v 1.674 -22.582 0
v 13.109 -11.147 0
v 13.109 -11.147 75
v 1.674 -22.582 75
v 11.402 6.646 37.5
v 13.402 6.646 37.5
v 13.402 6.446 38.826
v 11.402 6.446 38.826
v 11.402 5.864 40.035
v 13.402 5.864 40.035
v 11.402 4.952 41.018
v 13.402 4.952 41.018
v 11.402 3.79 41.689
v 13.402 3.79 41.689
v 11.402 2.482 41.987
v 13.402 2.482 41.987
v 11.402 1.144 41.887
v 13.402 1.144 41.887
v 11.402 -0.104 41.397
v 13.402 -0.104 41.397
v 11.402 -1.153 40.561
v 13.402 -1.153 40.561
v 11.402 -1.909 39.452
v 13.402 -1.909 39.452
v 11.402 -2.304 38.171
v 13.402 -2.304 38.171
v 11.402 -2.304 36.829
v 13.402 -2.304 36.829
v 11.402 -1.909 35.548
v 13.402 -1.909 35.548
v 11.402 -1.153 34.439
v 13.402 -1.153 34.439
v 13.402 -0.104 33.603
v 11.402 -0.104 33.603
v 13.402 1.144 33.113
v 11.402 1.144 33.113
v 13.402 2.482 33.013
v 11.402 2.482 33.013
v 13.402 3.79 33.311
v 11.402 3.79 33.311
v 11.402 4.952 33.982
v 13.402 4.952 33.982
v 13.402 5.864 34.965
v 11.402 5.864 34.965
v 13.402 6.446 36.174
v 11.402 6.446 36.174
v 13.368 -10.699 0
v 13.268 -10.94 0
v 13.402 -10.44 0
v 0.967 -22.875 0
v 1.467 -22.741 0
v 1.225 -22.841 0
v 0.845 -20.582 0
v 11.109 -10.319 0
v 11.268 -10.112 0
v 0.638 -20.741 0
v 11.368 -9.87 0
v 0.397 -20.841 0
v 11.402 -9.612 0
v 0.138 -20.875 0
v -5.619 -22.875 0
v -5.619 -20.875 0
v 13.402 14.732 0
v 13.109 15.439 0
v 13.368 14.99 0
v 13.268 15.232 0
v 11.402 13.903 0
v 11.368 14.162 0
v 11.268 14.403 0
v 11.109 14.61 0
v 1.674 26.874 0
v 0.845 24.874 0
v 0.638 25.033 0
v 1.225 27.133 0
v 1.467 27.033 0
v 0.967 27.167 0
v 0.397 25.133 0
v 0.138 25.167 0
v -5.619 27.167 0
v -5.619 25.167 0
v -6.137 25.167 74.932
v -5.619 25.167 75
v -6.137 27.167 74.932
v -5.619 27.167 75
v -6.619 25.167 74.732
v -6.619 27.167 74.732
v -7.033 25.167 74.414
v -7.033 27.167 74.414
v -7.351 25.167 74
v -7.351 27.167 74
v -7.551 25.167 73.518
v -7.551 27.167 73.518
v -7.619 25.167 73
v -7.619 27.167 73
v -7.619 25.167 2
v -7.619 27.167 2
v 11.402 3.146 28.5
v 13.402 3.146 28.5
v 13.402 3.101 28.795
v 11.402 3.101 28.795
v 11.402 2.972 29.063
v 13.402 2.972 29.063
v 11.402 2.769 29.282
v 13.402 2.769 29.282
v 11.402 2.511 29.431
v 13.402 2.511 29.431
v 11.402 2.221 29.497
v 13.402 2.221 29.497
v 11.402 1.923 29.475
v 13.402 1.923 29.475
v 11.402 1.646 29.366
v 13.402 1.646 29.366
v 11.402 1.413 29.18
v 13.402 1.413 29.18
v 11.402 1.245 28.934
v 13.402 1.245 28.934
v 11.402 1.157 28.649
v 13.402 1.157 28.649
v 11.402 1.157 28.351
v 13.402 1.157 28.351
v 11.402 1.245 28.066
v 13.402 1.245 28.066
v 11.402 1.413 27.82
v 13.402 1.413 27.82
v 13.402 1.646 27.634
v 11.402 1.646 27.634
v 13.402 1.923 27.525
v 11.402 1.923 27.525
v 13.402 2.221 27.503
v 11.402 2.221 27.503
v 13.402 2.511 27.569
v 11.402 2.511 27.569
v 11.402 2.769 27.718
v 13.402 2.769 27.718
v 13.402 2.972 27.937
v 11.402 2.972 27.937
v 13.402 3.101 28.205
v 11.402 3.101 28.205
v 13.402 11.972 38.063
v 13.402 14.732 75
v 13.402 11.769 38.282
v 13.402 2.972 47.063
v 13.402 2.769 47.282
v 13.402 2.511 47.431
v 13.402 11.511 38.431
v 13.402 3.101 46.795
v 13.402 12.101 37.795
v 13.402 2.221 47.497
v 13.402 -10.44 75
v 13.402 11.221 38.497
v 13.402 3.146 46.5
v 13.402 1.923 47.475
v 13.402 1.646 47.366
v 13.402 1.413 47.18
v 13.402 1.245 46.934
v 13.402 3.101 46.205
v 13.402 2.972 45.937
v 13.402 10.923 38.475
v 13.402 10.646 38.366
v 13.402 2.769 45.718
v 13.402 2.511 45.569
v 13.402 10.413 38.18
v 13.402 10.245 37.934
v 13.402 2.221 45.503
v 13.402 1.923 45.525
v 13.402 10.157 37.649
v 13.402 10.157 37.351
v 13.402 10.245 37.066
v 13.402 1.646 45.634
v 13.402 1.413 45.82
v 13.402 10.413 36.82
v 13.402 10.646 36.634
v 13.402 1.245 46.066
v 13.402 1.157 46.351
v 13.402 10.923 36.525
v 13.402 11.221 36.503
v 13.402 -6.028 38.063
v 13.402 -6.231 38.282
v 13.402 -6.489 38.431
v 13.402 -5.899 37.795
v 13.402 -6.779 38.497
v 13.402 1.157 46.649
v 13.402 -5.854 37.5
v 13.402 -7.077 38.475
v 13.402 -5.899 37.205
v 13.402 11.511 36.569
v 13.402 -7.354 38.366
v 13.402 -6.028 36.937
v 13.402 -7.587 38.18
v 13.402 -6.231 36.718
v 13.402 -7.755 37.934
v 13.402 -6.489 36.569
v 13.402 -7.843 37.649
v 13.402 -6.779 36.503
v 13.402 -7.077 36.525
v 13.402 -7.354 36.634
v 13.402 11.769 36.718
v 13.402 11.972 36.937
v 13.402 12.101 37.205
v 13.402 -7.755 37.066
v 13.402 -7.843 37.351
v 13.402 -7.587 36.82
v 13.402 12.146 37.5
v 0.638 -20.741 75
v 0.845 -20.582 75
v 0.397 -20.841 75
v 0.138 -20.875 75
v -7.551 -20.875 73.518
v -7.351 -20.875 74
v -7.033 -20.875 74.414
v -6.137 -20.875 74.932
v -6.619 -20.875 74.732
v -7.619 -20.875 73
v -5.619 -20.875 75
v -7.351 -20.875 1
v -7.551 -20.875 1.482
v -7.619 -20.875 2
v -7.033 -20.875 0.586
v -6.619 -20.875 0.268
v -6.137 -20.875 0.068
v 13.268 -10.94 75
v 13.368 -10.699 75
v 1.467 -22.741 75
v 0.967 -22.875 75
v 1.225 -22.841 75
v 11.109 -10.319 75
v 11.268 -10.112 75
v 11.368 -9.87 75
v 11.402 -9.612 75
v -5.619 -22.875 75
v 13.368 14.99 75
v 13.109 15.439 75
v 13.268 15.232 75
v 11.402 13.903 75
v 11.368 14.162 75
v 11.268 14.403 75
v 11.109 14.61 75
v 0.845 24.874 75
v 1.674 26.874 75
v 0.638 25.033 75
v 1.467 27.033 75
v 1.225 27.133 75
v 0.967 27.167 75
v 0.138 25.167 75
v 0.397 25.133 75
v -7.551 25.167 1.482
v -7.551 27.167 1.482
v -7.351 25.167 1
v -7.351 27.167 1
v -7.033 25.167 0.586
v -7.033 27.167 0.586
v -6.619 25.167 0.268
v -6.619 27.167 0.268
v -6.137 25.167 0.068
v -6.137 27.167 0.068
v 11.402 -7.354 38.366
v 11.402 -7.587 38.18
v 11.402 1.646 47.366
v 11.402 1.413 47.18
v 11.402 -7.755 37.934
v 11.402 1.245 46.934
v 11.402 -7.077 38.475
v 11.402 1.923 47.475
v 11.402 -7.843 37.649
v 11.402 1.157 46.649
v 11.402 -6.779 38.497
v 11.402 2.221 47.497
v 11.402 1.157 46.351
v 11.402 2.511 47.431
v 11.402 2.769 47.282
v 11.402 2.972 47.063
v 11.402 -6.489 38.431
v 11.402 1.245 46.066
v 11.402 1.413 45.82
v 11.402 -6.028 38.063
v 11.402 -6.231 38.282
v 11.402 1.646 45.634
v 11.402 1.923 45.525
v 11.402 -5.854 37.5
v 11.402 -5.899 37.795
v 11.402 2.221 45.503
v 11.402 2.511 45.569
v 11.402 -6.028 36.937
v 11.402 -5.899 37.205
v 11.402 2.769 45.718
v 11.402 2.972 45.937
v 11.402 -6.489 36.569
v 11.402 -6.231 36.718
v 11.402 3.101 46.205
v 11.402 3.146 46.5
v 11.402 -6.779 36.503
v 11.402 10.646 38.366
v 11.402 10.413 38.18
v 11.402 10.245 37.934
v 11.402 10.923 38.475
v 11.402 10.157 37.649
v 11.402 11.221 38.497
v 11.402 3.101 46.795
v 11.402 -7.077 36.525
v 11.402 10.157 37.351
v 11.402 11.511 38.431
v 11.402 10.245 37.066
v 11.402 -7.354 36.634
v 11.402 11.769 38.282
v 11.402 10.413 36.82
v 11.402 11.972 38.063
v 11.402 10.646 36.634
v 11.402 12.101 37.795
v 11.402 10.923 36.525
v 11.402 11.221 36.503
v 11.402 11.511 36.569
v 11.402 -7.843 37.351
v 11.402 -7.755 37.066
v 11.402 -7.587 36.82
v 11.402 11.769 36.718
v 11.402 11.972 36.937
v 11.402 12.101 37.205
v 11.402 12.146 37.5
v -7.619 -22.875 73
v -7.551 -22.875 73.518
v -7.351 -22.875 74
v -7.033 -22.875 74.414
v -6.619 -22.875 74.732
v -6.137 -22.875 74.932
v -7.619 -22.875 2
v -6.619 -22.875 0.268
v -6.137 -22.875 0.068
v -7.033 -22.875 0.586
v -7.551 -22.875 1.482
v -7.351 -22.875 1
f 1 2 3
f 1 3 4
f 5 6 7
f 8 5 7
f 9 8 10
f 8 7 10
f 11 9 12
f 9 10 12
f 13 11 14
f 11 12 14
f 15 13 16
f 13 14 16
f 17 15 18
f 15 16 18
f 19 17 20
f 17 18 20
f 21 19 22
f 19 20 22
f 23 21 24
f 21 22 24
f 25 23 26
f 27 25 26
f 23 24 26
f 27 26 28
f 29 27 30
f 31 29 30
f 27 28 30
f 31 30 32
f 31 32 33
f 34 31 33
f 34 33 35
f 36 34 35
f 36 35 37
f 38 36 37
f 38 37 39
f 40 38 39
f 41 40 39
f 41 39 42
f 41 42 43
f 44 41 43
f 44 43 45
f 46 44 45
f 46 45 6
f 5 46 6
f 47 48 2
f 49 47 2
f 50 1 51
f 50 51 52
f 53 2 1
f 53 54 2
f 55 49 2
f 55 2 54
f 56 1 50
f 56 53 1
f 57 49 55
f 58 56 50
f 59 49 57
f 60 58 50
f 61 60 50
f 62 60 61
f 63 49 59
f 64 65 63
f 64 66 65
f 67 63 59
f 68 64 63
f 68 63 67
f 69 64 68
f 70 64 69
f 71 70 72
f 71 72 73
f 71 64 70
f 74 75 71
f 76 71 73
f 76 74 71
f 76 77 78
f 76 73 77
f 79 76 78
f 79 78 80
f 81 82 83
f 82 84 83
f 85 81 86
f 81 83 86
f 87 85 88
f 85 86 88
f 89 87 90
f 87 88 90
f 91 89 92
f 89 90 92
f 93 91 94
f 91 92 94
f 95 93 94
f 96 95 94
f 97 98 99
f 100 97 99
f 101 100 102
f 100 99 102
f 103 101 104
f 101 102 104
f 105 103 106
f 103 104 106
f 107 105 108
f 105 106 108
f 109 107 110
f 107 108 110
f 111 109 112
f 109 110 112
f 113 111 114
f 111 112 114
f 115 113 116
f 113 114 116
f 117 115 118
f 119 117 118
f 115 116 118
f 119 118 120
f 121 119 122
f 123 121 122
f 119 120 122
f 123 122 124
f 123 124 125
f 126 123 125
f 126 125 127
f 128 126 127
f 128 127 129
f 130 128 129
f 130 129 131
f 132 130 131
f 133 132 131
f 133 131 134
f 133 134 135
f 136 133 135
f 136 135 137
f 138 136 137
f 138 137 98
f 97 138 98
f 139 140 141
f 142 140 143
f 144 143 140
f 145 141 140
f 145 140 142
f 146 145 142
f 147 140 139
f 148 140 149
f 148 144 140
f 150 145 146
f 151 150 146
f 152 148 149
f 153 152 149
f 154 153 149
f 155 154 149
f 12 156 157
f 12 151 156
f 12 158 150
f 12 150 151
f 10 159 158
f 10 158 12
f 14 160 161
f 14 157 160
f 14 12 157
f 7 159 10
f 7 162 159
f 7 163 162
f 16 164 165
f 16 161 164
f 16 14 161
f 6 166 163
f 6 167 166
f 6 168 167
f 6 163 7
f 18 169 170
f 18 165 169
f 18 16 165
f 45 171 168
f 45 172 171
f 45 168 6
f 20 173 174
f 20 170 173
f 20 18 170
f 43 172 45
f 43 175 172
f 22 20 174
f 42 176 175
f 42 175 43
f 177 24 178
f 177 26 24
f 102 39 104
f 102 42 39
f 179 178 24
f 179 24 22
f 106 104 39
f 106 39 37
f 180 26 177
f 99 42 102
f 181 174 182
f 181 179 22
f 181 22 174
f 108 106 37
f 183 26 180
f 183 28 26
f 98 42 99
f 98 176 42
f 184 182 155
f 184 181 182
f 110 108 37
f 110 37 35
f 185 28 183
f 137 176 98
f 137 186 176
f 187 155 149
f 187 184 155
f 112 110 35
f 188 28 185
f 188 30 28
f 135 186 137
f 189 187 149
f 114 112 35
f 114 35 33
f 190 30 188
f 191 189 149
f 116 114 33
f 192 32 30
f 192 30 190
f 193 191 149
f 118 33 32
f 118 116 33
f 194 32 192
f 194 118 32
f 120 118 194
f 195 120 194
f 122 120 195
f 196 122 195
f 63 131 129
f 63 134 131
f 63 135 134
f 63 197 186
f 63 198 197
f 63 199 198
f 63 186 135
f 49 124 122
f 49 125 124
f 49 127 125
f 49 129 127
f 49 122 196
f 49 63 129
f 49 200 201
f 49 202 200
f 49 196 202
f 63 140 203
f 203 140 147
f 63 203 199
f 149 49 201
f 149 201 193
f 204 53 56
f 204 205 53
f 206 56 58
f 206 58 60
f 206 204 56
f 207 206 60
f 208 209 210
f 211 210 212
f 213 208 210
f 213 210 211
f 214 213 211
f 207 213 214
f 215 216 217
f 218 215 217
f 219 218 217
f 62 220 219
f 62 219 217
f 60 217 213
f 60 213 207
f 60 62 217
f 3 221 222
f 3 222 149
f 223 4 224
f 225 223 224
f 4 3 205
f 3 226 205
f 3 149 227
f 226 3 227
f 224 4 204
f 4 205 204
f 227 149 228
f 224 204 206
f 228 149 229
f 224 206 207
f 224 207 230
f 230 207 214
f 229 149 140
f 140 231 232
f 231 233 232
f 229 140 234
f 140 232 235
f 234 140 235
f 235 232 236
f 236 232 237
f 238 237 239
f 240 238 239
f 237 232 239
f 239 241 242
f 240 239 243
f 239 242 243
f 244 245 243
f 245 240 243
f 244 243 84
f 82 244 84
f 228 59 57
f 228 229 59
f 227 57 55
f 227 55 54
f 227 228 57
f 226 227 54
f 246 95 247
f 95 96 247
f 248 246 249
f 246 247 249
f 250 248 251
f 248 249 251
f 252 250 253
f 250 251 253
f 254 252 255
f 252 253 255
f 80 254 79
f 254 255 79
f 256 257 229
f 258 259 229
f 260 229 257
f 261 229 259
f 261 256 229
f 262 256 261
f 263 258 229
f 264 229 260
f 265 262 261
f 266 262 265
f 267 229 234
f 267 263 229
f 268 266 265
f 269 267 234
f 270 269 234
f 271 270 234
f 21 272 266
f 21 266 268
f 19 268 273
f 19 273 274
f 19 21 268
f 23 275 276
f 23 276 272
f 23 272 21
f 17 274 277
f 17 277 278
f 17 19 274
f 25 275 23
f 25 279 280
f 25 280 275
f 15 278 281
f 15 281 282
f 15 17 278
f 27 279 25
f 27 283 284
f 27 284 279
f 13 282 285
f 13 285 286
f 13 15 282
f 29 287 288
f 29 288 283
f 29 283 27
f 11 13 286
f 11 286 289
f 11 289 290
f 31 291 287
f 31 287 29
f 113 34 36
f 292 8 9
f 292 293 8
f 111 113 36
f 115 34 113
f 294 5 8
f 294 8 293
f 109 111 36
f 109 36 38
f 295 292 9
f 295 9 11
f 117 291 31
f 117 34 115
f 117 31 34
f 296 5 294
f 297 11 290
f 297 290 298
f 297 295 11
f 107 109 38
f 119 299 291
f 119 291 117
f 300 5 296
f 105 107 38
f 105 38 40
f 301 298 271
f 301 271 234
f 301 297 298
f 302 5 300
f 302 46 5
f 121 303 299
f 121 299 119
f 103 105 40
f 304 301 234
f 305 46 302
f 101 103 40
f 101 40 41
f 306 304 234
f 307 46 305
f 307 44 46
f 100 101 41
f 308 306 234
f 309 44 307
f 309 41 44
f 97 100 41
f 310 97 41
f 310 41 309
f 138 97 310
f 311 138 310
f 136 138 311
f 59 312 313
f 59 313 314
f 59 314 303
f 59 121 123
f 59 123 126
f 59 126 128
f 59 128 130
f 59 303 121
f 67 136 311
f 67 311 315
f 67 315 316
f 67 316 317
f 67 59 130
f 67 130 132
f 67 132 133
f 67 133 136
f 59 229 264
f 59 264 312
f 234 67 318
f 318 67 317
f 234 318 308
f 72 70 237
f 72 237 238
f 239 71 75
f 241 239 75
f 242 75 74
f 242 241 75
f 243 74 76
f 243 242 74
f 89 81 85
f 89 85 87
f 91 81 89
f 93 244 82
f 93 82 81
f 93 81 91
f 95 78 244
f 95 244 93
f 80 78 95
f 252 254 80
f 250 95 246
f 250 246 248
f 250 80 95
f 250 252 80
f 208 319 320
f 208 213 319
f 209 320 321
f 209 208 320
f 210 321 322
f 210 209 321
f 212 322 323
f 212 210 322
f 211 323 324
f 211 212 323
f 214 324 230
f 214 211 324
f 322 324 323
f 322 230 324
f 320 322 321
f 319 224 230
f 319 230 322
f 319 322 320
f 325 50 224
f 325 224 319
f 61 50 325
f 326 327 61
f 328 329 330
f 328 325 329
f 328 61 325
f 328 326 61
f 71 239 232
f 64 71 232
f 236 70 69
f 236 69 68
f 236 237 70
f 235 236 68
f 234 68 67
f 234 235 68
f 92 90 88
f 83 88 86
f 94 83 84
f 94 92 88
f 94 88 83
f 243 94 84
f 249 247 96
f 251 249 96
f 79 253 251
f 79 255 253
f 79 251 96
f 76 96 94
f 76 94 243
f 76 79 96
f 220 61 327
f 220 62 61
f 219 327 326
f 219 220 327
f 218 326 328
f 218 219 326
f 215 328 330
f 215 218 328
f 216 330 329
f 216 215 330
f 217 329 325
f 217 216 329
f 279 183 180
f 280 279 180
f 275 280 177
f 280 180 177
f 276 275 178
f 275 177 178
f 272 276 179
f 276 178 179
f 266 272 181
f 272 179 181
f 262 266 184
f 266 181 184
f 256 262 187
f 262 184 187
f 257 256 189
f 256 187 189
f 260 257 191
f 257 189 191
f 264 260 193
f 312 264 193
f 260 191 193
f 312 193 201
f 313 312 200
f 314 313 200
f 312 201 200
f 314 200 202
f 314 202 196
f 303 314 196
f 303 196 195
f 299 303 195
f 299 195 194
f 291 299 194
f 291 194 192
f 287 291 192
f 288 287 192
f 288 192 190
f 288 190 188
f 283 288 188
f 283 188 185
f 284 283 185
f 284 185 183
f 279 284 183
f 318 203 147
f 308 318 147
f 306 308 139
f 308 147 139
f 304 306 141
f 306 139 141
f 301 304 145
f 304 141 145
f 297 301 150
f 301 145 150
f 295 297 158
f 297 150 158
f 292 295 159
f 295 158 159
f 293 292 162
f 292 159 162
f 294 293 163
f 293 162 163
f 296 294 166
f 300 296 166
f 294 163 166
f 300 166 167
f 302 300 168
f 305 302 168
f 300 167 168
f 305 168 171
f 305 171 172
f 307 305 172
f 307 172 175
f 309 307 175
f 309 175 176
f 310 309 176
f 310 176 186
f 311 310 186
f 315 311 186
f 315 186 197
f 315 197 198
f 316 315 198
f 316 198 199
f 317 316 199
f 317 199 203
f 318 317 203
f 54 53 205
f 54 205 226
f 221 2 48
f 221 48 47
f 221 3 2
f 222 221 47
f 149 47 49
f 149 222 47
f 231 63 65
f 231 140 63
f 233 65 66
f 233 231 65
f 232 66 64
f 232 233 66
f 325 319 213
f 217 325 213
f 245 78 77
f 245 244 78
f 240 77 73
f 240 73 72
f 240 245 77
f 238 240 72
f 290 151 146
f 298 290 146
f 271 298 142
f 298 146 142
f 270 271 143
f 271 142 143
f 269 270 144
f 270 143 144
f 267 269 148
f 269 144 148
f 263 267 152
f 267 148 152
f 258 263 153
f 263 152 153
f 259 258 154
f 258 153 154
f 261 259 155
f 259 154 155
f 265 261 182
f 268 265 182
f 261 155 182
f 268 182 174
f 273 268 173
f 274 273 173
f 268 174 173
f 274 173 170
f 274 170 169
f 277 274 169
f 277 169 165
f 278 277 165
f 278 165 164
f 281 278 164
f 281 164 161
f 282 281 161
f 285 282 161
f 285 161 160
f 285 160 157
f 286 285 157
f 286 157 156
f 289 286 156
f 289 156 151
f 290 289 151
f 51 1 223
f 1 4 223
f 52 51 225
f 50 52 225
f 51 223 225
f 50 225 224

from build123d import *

# Parameters (mm, degrees)
EXTRU_MINCE1_DEPTH      = 75
ESQUISSE2_R             = 4.5
ESQUISSE2_R_2           = 1
ENL_V_MAT_EXTRU_1_DEPTH = 10
CONG_1_R                = 2
CONG_2_R                = 2
CONG_3_R                = 2
CONG_4_R                = 2
CONG_5_R                = 1
CONG_6_R                = 1
CONG_7_R                = 1
CONG_8_R                = 1
CONG_9_R                = 1
CONG_10_R               = 1
CONG_11_R               = 1
CONG_12_R               = 1


with BuildPart() as part:
    # Esquisse1 → Extru.-Mince1 (new body)
    with BuildSketch(Plane.XY):
        Polygon((-7.619194622, 27.166626694), (1.380805378, 27.166626694), (13.401620658, 15.145811413), (13.401620658, -10.854188587), (1.380805378, -22.875003867), (-7.619194622, -22.875003867), (-7.619194622, -20.875003867), (0.552378253, -20.875003867), (11.401620658, -10.025761462), (11.401620658, 14.317384289), (0.552378253, 25.166626694), (-7.619194622, 25.166626694), align=None)
    extrude(amount=EXTRU_MINCE1_DEPTH)

    # Esquisse2 → Enlèv. mat.-Extru.1 (cut)
    with BuildSketch(Plane(origin=(13.401620658, 0, 0), x_dir=(0, 0, -1), z_dir=(1, 0, 0))):
        with Locations(Location((-37.5, 2.145811413, 0), (0, 0, 90))):
            Circle(ESQUISSE2_R)
        with Locations(Location((-46.5, 2.145811413, 0), (0, 0, 90))):
            Circle(ESQUISSE2_R_2)
        with Locations(Location((-28.5, 2.145811413, 0), (0, 0, 90))):
            Circle(ESQUISSE2_R_2)
        with Locations(Location((-37.5, 11.145811413, 0), (0, 0, 90))):
            Circle(ESQUISSE2_R_2)
        with Locations(Location((-37.5, -6.854188587, 0), (0, 0, 90))):
            Circle(ESQUISSE2_R_2)
    extrude(amount=-ENL_V_MAT_EXTRU_1_DEPTH, mode=Mode.SUBTRACT)

    # Congé1
    cong_1_edges = [part.edges().sort_by_distance(p)[0] for p in [
        (-7.619194622, 26.166626694, 0),
    ]]
    fillet(cong_1_edges, radius=CONG_1_R)

    # Congé2
    cong_2_edges = [part.edges().sort_by_distance(p)[0] for p in [
        (-7.619194622, -21.875003867, 0),
    ]]
    fillet(cong_2_edges, radius=CONG_2_R)

    # Congé3
    cong_3_edges = [part.edges().sort_by_distance(p)[0] for p in [
        (-7.619194622, -21.875003867, 75),
    ]]
    fillet(cong_3_edges, radius=CONG_3_R)

    # Congé4
    cong_4_edges = [part.edges().sort_by_distance(p)[0] for p in [
        (-7.619194622, 26.166626694, 75),
    ]]
    fillet(cong_4_edges, radius=CONG_4_R)

    # Congé5
    cong_5_edges = [part.edges().sort_by_distance(p)[0] for p in [
        (11.401620658, 14.317384289, 37.5),
    ]]
    fillet(cong_5_edges, radius=CONG_5_R)

    # Congé6
    cong_6_edges = [part.edges().sort_by_distance(p)[0] for p in [
        (11.401620658, -10.025761462, 37.5),
    ]]
    fillet(cong_6_edges, radius=CONG_6_R)

    # Congé7
    cong_7_edges = [part.edges().sort_by_distance(p)[0] for p in [
        (13.401620658, -10.854188587, 37.5),
    ]]
    fillet(cong_7_edges, radius=CONG_7_R)

    # Congé8
    cong_8_edges = [part.edges().sort_by_distance(p)[0] for p in [
        (13.401620658, 15.145811413, 37.5),
    ]]
    fillet(cong_8_edges, radius=CONG_8_R)

    # Congé9
    cong_9_edges = [part.edges().sort_by_distance(p)[0] for p in [
        (1.380805378, 27.166626694, 37.5),
    ]]
    fillet(cong_9_edges, radius=CONG_9_R)

    # Congé10
    cong_10_edges = [part.edges().sort_by_distance(p)[0] for p in [
        (1.380805378, -22.875003867, 37.5),
    ]]
    fillet(cong_10_edges, radius=CONG_10_R)

    # Congé11
    cong_11_edges = [part.edges().sort_by_distance(p)[0] for p in [
        (0.552378253, 25.166626694, 37.5),
    ]]
    fillet(cong_11_edges, radius=CONG_11_R)

    # Congé12
    cong_12_edges = [part.edges().sort_by_distance(p)[0] for p in [
        (0.552378253, -20.875003867, 37.5),
    ]]
    fillet(cong_12_edges, radius=CONG_12_R)


solid = part.part
